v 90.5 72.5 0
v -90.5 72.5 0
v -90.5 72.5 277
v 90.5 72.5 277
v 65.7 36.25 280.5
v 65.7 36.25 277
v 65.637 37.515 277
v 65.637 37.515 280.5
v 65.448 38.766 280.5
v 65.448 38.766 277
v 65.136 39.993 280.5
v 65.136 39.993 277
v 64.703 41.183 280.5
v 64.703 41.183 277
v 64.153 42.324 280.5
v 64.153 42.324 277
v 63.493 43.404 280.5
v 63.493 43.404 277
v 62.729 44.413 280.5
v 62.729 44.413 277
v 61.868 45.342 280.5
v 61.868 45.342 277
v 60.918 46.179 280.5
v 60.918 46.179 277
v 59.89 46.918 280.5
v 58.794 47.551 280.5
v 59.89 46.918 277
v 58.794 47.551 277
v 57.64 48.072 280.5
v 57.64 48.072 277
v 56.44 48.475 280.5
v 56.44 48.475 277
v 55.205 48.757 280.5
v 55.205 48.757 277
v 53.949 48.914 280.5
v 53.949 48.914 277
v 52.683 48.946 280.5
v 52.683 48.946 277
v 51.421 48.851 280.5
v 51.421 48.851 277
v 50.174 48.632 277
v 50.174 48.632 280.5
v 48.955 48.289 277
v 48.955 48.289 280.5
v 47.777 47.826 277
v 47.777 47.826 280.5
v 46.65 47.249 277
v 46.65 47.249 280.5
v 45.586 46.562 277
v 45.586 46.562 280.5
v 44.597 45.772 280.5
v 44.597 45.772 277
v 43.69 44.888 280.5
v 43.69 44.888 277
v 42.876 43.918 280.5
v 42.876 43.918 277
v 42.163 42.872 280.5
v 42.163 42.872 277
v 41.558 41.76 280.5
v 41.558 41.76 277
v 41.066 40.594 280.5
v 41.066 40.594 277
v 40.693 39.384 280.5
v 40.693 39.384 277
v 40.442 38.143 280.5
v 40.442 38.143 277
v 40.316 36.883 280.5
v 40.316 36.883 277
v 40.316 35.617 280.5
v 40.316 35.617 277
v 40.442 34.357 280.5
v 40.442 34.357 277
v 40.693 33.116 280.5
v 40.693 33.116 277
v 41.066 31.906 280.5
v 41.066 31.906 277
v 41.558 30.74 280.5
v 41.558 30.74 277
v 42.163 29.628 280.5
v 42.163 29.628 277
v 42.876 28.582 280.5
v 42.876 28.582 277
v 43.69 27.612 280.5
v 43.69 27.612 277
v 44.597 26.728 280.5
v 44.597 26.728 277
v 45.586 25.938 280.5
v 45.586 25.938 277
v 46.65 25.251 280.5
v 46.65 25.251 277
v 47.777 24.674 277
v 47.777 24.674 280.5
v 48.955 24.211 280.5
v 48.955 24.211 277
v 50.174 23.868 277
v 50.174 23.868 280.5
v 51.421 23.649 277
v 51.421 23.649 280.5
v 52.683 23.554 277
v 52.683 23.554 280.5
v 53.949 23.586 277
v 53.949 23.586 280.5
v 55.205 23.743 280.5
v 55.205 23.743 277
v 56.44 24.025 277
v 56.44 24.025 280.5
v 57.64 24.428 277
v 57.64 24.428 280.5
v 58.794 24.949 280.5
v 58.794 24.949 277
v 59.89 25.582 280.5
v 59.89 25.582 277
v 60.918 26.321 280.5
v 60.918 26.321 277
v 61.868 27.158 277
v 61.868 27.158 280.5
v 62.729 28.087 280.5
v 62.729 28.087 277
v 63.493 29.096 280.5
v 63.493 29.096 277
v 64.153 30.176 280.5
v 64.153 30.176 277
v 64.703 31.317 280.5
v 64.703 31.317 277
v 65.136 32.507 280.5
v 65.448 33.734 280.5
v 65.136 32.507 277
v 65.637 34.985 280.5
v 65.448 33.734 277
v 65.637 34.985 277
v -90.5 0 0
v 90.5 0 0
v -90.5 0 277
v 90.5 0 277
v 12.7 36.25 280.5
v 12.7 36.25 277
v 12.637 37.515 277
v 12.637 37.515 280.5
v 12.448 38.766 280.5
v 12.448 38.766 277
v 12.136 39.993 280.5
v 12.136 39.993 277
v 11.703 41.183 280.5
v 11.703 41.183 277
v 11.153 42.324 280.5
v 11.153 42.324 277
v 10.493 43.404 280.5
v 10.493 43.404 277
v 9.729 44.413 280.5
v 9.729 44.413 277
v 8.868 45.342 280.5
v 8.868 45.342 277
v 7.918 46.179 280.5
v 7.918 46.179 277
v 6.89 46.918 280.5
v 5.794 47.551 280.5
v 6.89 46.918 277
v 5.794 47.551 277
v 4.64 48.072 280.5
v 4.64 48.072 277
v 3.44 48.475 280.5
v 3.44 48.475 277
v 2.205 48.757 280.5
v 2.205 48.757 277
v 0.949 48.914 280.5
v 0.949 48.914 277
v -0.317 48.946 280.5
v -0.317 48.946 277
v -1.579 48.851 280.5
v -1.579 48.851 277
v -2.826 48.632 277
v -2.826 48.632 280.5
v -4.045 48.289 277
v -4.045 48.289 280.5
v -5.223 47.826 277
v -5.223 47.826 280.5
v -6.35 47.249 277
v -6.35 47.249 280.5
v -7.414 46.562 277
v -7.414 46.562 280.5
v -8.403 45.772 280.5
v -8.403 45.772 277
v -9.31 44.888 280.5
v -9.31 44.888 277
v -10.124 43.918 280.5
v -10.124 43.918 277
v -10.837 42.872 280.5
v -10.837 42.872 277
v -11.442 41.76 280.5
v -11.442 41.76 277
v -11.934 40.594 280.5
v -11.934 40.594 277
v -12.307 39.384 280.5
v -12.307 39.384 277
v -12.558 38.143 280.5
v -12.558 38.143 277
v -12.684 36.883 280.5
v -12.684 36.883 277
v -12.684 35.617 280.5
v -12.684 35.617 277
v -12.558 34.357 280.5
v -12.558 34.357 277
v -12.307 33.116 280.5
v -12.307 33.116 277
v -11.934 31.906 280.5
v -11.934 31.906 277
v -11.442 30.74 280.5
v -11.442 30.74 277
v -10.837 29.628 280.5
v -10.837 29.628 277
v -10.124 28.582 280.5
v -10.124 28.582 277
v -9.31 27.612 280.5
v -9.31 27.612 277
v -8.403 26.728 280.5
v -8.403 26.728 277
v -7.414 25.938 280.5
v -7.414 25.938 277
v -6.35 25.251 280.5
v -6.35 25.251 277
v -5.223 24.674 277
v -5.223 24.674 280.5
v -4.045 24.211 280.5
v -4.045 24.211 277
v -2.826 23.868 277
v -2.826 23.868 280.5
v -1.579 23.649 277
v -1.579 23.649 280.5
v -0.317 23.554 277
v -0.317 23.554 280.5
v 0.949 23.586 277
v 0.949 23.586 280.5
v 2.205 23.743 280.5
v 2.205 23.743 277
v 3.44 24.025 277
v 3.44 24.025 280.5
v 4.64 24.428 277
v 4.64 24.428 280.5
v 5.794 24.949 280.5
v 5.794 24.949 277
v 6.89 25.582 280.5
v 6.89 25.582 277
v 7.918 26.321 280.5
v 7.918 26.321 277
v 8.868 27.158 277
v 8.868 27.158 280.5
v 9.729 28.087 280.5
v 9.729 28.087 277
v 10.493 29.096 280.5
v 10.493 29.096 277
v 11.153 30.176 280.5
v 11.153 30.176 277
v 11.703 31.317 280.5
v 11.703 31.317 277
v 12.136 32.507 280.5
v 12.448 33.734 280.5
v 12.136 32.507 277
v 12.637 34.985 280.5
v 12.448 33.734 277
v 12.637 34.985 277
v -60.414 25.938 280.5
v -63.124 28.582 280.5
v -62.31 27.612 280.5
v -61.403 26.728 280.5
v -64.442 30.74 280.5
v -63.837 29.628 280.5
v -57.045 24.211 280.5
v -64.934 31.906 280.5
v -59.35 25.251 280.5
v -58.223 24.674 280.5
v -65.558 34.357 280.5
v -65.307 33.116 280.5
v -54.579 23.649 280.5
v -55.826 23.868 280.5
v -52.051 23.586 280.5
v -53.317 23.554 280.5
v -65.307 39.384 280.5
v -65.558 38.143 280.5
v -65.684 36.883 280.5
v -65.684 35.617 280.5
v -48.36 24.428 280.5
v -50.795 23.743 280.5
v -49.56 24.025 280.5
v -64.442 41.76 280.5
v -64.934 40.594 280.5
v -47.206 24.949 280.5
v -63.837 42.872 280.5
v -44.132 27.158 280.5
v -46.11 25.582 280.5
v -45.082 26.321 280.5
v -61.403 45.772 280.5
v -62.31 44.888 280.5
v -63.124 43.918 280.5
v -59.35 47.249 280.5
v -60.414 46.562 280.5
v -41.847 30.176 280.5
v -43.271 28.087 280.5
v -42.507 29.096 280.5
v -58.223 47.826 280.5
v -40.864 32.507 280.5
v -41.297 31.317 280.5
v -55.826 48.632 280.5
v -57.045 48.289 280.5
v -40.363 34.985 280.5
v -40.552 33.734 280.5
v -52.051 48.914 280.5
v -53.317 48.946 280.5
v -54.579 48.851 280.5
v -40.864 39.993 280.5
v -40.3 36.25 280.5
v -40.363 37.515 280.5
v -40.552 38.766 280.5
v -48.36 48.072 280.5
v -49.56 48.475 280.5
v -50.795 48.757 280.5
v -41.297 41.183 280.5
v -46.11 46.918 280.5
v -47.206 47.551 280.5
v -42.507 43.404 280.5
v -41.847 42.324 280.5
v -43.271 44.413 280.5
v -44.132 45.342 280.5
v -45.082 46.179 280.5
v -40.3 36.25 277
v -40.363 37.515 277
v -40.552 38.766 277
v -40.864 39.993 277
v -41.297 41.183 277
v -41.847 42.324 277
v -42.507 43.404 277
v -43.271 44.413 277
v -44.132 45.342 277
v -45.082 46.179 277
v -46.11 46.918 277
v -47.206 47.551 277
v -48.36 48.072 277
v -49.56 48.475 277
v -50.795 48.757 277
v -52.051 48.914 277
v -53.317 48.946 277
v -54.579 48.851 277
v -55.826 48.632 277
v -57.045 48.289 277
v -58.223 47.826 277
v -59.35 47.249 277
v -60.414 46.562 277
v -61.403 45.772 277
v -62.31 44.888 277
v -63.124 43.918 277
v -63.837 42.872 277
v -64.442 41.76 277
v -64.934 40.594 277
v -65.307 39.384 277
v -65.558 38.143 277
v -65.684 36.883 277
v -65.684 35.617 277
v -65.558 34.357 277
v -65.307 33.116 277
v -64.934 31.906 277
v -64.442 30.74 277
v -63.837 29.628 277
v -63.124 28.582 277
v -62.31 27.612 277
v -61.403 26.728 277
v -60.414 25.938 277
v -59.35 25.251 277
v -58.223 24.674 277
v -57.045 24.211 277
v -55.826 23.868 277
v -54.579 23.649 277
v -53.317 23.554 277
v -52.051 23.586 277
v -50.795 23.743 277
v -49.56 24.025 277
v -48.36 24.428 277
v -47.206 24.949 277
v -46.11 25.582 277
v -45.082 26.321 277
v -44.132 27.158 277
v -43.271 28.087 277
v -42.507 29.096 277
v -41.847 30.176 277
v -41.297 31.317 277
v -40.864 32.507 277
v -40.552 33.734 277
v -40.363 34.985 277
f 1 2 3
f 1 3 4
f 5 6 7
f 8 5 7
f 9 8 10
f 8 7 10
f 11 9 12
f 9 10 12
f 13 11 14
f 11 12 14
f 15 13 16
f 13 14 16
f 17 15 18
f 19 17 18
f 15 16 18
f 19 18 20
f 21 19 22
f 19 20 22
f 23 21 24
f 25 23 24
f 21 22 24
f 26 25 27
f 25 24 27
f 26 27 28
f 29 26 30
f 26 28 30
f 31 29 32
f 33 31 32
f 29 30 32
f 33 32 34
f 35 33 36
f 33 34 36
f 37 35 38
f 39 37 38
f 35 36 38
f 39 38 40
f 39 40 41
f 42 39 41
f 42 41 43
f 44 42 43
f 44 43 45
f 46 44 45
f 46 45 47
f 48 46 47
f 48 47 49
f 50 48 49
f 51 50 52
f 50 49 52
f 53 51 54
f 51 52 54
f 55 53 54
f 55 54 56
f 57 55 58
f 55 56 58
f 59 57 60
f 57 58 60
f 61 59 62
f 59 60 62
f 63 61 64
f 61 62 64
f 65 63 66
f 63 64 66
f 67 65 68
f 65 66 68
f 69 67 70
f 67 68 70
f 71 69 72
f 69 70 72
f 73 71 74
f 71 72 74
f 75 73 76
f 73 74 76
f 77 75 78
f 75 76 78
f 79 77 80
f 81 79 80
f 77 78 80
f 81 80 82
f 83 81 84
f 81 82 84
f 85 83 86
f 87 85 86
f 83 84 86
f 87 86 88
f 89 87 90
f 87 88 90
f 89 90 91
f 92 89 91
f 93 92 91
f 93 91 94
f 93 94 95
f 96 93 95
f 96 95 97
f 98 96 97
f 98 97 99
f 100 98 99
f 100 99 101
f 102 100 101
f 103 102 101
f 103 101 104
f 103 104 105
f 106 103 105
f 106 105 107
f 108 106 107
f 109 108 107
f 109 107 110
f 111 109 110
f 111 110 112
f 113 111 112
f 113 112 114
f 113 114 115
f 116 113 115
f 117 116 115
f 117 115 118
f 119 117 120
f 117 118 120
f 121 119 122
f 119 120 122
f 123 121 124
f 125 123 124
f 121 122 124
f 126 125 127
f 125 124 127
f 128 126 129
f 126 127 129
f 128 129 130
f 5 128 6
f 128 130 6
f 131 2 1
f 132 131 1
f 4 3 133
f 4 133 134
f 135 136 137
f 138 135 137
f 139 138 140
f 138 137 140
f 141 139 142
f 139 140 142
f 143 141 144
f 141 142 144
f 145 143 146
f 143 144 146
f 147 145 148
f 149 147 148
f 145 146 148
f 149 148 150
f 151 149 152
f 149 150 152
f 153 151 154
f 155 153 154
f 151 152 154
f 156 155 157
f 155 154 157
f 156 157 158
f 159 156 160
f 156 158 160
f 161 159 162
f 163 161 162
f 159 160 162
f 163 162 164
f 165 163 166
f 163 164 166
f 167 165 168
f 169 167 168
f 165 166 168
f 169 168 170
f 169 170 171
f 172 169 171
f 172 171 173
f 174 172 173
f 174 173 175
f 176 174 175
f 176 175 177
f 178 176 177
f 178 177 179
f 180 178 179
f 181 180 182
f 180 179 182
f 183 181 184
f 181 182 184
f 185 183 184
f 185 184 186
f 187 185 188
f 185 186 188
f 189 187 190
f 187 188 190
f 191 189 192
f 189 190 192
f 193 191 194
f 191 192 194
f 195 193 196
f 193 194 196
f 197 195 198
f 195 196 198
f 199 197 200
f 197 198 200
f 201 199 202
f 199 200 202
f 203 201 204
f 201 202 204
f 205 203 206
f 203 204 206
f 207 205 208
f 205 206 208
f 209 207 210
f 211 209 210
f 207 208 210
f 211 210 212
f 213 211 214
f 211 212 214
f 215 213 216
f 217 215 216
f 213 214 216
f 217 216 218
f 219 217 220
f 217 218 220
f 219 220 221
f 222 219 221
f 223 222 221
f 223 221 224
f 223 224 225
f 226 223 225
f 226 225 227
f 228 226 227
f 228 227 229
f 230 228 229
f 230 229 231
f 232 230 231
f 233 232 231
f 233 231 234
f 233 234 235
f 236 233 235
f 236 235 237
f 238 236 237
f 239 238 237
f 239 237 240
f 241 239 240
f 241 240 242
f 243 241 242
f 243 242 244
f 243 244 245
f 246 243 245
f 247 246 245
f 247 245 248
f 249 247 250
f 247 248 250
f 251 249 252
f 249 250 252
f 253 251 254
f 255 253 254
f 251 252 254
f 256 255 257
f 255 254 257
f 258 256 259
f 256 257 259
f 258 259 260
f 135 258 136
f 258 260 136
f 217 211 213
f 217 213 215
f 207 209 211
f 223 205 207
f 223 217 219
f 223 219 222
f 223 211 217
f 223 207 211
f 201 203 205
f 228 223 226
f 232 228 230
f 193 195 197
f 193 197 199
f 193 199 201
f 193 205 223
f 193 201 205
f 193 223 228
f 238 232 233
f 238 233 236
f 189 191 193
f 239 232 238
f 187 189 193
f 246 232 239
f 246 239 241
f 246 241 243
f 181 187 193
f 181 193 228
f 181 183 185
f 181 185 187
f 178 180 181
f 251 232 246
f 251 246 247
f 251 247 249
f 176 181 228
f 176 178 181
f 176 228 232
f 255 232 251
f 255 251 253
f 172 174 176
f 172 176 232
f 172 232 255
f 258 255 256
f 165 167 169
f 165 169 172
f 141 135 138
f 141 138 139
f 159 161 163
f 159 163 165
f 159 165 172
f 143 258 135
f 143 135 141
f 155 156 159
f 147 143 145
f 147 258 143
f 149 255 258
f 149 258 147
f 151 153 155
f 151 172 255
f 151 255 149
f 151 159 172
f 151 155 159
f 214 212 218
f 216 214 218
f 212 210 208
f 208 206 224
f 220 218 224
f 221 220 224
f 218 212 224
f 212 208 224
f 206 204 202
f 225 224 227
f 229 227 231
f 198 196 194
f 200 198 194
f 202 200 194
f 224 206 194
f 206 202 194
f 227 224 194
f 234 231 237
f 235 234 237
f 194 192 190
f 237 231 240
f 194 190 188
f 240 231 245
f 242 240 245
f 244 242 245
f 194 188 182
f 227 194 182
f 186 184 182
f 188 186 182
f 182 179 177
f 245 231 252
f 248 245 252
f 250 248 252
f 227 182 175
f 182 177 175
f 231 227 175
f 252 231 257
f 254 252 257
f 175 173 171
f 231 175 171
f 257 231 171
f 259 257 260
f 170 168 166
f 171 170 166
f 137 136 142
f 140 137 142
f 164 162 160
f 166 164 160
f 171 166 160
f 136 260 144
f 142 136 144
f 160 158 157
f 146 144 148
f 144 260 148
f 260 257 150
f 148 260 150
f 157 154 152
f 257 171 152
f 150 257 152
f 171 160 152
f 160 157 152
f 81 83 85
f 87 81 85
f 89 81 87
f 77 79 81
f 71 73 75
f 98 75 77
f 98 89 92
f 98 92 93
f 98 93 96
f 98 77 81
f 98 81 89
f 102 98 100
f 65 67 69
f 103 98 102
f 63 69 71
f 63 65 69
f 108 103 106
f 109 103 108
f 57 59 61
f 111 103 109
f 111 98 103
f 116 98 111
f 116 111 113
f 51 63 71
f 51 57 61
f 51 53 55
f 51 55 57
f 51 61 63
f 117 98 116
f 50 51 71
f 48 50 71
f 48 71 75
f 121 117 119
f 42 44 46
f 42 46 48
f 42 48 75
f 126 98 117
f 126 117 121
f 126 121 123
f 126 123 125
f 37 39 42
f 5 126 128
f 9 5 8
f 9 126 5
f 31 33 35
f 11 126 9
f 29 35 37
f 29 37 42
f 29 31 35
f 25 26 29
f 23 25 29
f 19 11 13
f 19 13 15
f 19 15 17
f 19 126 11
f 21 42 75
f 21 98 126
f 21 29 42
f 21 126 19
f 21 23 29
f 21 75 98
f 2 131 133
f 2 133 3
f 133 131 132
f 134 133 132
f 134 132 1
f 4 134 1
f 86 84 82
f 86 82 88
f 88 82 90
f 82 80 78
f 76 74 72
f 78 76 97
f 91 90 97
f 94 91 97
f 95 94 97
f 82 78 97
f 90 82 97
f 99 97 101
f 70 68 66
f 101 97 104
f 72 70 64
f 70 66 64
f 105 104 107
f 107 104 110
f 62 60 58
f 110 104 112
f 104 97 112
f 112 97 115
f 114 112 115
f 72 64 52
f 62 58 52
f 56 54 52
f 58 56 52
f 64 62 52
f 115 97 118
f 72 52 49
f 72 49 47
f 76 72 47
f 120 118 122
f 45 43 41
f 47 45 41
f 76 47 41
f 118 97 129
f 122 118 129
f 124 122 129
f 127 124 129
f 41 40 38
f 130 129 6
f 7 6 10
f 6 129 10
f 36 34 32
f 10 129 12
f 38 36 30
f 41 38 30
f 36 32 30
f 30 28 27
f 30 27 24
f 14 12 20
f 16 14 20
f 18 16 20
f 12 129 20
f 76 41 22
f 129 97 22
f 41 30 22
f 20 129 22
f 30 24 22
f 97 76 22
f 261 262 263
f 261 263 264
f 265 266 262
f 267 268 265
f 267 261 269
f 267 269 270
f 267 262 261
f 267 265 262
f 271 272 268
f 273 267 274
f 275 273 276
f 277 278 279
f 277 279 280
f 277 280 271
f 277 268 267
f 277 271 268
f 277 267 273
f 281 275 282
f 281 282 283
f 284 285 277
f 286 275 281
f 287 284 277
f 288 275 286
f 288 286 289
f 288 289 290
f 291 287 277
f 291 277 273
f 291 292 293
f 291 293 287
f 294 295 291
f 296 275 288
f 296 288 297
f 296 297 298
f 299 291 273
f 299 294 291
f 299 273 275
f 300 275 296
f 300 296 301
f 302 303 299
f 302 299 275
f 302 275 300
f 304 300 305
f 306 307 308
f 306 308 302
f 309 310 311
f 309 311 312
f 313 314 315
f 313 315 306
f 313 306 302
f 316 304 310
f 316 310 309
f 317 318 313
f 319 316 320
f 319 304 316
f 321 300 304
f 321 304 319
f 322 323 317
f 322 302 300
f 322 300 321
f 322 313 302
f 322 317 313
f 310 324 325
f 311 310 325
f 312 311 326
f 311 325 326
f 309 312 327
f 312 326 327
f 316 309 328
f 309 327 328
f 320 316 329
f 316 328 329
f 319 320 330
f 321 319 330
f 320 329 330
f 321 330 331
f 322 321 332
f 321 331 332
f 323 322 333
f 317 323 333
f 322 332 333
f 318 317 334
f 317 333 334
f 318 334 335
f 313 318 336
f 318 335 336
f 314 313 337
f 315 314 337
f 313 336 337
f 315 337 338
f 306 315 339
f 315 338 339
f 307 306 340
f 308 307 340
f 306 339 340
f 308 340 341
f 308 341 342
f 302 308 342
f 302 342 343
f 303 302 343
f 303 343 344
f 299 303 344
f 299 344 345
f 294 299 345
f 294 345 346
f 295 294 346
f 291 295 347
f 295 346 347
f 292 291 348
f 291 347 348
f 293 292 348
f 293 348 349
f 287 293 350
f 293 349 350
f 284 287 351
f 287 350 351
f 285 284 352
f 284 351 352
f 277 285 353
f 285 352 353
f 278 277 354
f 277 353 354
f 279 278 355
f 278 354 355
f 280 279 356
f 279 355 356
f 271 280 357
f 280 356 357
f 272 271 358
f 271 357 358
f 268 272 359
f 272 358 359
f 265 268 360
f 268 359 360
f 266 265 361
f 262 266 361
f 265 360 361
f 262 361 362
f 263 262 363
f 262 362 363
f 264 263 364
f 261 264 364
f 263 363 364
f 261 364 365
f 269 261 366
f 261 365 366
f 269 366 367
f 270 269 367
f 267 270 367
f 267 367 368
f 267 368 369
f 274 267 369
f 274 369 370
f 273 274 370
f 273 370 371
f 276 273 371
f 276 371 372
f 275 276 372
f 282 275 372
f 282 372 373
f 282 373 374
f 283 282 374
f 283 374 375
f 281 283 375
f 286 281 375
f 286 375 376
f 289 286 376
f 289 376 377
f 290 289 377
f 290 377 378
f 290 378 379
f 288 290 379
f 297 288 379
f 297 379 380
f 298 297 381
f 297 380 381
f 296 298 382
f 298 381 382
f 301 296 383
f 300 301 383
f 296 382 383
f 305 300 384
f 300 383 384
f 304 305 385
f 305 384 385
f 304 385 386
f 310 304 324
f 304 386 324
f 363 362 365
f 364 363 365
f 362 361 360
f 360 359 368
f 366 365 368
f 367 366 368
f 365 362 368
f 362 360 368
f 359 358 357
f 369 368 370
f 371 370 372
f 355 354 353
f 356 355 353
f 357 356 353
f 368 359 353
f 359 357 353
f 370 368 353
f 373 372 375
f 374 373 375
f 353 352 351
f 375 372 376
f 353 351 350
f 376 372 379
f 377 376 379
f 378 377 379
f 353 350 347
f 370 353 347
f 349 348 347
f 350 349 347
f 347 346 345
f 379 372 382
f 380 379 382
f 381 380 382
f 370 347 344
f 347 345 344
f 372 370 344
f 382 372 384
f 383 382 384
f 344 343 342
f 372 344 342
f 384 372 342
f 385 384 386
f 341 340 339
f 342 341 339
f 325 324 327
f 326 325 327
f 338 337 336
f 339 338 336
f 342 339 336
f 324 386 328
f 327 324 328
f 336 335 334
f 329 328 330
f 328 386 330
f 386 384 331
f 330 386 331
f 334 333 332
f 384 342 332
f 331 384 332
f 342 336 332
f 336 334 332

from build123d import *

# Parameters (mm, degrees)
F0_W     = 181
F0_H     = 72.5
F1_DEPTH = 277
F2_R     = 12.7
F3_DEPTH = 3.5


with BuildPart() as f1:
    # F0 (on Top) → F1 (new body)
    with BuildSketch(Plane.XY):
        with Locations((0, 36.25)):
            Rectangle(F0_W, F0_H)
    extrude(amount=F1_DEPTH)


with BuildPart() as f3:
    # F2 (on face) → F3 (new body)
    with BuildSketch(Plane.XY.offset(277)):
        with Locations((-53, 36.25)):
            Circle(F2_R)
        with Locations((53, 36.25)):
            Circle(F2_R)
        with Locations((0, 36.25)):
            Circle(F2_R)
    extrude(amount=F3_DEPTH)


solid = Compound([f1.part, f3.part])
